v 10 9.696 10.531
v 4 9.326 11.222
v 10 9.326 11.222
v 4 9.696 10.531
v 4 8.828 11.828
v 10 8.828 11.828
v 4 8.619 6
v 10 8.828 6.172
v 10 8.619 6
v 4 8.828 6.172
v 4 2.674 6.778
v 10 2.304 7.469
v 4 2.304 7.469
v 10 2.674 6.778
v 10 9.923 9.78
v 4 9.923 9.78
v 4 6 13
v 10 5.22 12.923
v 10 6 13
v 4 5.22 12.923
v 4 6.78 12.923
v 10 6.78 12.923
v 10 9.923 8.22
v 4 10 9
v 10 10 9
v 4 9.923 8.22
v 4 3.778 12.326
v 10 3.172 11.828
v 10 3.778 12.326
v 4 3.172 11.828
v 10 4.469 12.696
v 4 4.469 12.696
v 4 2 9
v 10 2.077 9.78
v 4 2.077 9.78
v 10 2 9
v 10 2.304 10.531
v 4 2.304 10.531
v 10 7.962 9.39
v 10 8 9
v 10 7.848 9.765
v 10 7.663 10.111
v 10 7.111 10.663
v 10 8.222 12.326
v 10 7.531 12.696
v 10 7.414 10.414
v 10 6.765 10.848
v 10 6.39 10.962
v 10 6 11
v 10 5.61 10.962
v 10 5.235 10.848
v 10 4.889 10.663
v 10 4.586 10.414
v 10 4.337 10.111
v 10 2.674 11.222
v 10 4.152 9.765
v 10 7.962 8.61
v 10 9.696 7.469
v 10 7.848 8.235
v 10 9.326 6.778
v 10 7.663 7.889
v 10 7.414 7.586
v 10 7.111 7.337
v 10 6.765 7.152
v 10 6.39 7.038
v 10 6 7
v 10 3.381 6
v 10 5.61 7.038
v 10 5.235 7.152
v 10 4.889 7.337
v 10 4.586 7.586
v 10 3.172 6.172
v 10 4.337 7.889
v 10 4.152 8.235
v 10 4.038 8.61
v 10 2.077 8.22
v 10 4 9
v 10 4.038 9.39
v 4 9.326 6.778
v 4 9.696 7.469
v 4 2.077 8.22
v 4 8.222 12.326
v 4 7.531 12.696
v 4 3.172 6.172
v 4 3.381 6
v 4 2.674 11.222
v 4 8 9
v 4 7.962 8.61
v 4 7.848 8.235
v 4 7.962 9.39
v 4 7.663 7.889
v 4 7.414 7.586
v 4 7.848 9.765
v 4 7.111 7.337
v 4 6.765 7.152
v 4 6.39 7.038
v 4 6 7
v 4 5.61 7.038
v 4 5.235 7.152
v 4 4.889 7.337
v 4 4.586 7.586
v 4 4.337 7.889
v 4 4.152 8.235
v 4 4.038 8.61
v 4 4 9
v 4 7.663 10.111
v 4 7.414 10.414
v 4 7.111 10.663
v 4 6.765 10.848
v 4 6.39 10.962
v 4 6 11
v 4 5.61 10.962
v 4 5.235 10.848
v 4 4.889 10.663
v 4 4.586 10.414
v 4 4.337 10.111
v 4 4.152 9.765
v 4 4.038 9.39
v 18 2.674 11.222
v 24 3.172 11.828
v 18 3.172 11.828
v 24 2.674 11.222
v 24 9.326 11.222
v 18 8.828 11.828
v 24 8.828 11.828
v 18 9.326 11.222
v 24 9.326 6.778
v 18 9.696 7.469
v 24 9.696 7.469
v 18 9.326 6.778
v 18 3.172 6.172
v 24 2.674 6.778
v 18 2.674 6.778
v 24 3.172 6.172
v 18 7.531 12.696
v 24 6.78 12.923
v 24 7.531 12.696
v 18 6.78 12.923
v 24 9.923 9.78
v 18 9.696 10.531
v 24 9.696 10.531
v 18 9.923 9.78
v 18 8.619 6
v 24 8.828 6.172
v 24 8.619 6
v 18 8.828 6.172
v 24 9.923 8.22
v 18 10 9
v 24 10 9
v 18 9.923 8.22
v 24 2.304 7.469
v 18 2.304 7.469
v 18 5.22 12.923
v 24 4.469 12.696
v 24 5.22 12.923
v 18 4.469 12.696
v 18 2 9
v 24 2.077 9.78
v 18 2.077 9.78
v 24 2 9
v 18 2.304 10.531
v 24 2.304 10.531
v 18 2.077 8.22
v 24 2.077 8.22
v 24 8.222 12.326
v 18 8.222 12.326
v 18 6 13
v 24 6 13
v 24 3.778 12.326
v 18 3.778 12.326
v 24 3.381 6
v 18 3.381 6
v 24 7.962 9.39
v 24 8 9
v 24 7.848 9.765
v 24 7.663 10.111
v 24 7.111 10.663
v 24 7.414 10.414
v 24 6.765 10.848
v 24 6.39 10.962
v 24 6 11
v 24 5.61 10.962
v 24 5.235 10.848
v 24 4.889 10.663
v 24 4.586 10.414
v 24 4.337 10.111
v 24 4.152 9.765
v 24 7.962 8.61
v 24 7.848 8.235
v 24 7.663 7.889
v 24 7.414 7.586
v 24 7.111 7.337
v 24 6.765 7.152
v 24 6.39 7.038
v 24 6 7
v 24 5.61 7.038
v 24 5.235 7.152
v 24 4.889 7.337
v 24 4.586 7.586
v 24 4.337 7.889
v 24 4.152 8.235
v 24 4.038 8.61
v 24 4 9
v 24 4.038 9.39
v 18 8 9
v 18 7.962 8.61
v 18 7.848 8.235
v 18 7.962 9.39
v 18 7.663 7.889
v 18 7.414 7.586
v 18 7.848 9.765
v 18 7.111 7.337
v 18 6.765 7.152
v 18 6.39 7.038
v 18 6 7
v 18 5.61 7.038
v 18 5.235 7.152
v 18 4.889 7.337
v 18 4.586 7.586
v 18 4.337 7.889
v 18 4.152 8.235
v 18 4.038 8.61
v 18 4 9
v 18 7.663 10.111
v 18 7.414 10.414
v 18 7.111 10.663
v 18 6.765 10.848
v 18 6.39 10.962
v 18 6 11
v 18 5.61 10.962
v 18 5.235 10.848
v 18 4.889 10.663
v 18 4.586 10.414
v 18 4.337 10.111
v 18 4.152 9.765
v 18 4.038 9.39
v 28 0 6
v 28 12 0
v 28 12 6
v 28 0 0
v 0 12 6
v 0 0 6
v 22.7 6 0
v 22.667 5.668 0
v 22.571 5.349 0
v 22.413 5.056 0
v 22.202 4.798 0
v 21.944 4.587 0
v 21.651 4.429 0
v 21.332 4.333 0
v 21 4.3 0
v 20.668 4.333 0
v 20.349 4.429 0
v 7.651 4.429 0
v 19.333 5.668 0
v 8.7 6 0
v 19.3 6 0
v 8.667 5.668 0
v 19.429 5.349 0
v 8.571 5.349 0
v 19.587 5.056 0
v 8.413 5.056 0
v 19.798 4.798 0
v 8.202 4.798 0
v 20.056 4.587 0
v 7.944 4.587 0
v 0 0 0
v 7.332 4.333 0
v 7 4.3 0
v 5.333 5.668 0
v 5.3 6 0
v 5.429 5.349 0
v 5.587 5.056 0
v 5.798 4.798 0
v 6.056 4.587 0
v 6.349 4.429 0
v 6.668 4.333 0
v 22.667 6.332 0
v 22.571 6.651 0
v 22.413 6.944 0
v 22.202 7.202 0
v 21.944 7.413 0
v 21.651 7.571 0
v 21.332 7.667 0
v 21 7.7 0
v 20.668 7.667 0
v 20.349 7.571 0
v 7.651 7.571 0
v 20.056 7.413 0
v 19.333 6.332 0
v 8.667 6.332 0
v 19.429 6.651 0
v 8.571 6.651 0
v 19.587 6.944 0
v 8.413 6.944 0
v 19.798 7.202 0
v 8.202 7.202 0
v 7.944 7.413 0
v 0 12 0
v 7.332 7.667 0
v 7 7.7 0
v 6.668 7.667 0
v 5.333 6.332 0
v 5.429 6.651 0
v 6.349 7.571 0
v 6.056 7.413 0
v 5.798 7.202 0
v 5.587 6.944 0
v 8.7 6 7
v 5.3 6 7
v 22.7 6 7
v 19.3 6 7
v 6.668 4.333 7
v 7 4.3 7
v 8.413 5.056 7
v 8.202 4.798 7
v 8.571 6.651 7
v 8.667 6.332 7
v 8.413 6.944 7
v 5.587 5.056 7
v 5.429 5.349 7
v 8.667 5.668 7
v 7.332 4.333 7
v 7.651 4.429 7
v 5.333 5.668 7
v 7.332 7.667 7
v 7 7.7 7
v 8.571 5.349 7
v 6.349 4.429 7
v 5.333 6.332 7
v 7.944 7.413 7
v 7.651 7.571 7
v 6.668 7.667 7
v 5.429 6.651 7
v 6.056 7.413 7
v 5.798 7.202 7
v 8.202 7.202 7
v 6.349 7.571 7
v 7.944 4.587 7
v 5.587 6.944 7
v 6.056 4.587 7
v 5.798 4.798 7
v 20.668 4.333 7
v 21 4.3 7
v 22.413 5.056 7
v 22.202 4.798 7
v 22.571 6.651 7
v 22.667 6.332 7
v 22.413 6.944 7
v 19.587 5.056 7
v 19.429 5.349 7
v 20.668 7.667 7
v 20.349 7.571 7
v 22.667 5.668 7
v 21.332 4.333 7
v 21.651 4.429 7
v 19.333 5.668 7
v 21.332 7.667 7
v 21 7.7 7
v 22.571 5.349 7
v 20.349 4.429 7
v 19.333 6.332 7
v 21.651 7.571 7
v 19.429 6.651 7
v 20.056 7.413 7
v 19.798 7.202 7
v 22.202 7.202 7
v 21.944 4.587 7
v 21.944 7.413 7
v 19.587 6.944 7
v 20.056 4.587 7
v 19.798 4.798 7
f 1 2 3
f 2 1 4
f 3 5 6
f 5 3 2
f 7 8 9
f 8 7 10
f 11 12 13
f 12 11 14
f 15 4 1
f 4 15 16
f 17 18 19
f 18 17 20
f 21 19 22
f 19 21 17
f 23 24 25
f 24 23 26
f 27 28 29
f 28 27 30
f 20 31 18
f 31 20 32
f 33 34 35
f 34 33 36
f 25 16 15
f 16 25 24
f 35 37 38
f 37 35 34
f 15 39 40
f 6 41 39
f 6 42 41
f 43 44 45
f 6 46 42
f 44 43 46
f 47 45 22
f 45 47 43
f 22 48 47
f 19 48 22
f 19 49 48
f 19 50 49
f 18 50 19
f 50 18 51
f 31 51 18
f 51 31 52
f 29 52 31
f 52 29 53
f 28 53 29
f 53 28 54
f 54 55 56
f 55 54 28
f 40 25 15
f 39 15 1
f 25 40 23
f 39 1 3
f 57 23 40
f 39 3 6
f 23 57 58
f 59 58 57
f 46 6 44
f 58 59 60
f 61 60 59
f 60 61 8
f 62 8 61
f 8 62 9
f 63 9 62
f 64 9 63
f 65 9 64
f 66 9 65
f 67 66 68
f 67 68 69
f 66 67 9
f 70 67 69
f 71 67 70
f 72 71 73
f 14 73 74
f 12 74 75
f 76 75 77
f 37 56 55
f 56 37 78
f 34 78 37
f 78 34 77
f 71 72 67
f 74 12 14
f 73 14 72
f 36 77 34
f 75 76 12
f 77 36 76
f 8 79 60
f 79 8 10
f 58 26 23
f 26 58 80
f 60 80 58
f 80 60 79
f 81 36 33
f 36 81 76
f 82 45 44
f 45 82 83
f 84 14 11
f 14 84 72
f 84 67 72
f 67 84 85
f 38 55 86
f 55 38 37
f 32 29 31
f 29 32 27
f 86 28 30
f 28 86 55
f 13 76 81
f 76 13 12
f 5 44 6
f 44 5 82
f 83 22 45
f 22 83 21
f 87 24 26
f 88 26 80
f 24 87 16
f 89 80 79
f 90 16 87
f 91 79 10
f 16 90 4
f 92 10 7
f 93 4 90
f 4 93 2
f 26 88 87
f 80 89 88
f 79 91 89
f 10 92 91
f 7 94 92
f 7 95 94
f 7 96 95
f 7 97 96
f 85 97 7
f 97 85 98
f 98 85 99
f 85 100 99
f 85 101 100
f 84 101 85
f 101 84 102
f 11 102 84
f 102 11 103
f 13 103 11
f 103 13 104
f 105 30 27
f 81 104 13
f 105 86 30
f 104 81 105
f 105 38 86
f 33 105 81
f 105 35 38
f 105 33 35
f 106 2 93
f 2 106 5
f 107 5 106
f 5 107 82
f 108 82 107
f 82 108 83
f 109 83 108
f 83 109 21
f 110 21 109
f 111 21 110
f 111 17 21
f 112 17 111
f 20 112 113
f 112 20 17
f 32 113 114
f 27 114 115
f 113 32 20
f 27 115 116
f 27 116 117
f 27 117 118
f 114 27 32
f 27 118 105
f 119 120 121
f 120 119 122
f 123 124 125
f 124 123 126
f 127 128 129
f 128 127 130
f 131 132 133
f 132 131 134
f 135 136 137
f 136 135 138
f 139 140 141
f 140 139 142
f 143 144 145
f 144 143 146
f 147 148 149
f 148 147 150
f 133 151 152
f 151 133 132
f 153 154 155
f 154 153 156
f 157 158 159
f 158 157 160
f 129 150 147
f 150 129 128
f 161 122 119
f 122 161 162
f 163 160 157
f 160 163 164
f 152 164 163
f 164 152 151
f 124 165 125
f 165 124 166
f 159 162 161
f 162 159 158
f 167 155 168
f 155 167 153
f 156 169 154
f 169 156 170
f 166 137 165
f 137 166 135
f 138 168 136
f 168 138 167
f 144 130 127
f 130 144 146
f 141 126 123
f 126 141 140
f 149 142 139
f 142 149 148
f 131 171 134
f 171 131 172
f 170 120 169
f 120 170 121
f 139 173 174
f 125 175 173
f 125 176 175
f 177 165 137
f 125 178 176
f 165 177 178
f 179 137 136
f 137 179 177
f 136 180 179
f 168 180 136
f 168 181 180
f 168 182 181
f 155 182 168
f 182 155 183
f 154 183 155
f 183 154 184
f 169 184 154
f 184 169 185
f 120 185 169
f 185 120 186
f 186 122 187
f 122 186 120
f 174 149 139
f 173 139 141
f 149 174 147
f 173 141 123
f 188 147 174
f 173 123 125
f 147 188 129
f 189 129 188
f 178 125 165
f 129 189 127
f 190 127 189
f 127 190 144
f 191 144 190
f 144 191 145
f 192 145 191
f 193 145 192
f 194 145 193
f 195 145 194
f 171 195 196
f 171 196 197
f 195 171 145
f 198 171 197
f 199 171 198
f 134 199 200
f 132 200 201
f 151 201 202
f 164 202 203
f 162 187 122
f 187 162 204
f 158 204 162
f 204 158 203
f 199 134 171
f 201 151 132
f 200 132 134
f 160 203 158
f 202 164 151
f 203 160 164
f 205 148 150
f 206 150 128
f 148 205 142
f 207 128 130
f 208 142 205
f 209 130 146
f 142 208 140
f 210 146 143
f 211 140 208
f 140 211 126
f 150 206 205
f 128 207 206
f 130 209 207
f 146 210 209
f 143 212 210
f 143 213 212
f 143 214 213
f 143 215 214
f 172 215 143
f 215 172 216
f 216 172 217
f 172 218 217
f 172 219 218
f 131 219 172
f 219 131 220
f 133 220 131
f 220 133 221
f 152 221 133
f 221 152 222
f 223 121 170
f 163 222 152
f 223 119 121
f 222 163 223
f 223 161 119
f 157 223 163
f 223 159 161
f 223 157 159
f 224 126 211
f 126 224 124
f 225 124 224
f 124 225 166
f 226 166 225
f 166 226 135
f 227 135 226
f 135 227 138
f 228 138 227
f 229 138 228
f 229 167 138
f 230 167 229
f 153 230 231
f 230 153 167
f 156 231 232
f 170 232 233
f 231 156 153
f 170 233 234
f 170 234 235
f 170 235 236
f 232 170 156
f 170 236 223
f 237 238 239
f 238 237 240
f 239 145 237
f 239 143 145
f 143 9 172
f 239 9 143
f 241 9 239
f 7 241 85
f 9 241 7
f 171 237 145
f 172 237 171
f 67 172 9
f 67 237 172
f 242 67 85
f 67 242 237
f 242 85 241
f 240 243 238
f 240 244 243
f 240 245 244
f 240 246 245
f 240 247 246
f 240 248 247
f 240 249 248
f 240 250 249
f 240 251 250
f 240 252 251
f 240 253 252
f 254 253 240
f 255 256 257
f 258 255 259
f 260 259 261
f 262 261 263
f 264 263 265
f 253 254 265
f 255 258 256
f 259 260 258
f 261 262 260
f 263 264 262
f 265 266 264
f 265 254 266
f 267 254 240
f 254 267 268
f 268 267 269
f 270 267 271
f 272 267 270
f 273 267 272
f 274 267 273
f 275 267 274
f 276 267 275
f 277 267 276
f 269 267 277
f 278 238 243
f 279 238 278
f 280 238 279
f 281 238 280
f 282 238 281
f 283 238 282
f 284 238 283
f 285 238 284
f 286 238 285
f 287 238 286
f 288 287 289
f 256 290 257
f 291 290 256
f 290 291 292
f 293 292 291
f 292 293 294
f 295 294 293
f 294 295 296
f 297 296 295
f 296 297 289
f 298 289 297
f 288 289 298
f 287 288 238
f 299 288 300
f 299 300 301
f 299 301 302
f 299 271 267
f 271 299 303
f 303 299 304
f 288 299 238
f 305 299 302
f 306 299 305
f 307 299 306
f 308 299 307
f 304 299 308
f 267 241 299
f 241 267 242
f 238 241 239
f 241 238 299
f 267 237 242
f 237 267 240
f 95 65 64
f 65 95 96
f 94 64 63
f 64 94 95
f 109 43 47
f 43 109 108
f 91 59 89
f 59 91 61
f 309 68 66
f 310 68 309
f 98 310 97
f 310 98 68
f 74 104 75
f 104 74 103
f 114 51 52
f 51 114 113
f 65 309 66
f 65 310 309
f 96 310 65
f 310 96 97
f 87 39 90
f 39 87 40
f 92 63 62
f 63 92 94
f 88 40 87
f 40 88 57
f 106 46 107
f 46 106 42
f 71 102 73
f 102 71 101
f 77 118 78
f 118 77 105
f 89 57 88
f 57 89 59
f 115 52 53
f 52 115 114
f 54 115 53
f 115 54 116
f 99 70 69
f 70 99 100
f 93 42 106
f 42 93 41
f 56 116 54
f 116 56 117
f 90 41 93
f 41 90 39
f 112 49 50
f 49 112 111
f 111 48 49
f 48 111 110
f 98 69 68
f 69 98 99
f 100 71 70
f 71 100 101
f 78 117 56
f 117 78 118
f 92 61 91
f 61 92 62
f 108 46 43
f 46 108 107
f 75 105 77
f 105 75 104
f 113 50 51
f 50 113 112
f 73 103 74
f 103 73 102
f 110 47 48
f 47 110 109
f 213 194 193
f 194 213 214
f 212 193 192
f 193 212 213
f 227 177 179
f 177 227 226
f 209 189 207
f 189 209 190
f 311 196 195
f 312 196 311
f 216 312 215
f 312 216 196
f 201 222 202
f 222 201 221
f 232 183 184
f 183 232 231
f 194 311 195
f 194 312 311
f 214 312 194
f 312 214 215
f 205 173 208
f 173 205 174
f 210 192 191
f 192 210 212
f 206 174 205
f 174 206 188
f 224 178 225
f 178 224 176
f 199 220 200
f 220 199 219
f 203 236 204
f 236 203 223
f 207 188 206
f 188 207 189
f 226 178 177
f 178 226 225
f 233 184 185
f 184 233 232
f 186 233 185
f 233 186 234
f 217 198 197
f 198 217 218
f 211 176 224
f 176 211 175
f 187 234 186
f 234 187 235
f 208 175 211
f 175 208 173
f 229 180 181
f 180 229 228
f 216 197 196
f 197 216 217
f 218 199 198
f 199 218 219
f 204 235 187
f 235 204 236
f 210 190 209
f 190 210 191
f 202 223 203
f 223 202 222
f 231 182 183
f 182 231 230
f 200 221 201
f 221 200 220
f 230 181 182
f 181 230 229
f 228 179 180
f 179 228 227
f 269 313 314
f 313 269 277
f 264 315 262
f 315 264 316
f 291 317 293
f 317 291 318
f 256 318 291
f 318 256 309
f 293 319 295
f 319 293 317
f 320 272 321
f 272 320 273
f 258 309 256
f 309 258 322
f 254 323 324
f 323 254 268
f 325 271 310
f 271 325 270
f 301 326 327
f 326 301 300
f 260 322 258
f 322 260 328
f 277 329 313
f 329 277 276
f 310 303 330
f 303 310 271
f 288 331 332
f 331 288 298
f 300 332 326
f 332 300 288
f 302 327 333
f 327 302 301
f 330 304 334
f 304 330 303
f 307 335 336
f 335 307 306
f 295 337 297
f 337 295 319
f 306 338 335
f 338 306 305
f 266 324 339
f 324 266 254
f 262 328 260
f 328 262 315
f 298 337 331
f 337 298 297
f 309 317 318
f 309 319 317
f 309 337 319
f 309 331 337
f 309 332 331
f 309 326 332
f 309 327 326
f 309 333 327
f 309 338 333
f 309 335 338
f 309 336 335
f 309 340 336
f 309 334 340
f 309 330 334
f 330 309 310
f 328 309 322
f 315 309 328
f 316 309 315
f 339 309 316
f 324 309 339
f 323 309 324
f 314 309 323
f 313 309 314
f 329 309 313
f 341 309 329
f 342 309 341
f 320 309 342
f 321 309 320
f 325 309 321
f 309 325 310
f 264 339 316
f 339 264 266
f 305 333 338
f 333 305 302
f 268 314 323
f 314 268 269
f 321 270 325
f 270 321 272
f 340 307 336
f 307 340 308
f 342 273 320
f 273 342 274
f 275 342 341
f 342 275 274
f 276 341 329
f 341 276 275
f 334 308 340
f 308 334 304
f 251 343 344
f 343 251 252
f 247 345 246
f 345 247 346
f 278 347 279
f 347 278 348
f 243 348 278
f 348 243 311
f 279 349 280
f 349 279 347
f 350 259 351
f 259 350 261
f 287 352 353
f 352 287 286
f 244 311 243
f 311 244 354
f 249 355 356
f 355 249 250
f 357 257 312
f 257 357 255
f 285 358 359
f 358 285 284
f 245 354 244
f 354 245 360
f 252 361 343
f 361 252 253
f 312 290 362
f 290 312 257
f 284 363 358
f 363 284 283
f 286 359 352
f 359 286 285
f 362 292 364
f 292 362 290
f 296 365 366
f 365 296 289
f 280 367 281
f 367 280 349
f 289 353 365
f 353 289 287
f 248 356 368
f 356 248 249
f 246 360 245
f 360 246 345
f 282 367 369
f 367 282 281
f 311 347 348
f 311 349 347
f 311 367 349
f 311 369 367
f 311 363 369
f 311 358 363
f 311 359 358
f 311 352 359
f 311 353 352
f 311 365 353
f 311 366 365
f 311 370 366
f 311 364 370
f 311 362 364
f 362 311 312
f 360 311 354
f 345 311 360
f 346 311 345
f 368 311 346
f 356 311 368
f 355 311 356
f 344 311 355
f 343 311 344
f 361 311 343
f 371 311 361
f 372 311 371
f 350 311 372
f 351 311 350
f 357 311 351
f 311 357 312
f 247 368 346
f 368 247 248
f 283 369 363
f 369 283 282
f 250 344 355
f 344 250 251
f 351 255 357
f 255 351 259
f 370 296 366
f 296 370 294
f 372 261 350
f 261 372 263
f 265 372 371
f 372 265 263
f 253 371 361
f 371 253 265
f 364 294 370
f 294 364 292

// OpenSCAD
$fn = 32;

// ----------------------------------------------------------------------
// Cable clip: cable 4 mm, clamp 8 mm, base 28 mm
// ----------------------------------------------------------------------

// --- parameters (mm) ---
plate_x = 28;             // base length, X
plate_y = 12;             // base width, Y
plate_t = 6;              // base thickness
wire_seat_d = 8;          // clamp outside diameter
clip_t = 2;               // clamp wall
cable_d = 4;              // cable opening
ring_w = 6;               // clamp width along the cable
screw_d = 3.4;            // screw clearance
sink = 1;                 // overlap of the clamp into the base
pitch = 14;               // distance between the two clamps

module base() {
  cube([plate_x, plate_y, plate_t]);
}

module clamps() {
  for (sx = [-1, 1])
    translate([plate_x / 2 + sx * pitch / 2, plate_y / 2, plate_t + wire_seat_d / 2 - sink]) rotate([0, 90, 0])
      cylinder(h = ring_w, d = wire_seat_d, center = true);
}

difference() {
  union() {
    base();
    clamps();
  }
  for (sx = [-1, 1])
    translate([plate_x / 2 + sx * pitch / 2, plate_y / 2, plate_t + wire_seat_d / 2 - sink]) rotate([0, 90, 0]) translate([0, 0, -ring_w / 2 - 1]) cylinder(h = ring_w + 2, d = cable_d);
  translate([7, plate_y / 2, -1]) cylinder(h = plate_t + 2, d = screw_d);
  translate([21, plate_y / 2, -1]) cylinder(h = plate_t + 2, d = screw_d);
}
